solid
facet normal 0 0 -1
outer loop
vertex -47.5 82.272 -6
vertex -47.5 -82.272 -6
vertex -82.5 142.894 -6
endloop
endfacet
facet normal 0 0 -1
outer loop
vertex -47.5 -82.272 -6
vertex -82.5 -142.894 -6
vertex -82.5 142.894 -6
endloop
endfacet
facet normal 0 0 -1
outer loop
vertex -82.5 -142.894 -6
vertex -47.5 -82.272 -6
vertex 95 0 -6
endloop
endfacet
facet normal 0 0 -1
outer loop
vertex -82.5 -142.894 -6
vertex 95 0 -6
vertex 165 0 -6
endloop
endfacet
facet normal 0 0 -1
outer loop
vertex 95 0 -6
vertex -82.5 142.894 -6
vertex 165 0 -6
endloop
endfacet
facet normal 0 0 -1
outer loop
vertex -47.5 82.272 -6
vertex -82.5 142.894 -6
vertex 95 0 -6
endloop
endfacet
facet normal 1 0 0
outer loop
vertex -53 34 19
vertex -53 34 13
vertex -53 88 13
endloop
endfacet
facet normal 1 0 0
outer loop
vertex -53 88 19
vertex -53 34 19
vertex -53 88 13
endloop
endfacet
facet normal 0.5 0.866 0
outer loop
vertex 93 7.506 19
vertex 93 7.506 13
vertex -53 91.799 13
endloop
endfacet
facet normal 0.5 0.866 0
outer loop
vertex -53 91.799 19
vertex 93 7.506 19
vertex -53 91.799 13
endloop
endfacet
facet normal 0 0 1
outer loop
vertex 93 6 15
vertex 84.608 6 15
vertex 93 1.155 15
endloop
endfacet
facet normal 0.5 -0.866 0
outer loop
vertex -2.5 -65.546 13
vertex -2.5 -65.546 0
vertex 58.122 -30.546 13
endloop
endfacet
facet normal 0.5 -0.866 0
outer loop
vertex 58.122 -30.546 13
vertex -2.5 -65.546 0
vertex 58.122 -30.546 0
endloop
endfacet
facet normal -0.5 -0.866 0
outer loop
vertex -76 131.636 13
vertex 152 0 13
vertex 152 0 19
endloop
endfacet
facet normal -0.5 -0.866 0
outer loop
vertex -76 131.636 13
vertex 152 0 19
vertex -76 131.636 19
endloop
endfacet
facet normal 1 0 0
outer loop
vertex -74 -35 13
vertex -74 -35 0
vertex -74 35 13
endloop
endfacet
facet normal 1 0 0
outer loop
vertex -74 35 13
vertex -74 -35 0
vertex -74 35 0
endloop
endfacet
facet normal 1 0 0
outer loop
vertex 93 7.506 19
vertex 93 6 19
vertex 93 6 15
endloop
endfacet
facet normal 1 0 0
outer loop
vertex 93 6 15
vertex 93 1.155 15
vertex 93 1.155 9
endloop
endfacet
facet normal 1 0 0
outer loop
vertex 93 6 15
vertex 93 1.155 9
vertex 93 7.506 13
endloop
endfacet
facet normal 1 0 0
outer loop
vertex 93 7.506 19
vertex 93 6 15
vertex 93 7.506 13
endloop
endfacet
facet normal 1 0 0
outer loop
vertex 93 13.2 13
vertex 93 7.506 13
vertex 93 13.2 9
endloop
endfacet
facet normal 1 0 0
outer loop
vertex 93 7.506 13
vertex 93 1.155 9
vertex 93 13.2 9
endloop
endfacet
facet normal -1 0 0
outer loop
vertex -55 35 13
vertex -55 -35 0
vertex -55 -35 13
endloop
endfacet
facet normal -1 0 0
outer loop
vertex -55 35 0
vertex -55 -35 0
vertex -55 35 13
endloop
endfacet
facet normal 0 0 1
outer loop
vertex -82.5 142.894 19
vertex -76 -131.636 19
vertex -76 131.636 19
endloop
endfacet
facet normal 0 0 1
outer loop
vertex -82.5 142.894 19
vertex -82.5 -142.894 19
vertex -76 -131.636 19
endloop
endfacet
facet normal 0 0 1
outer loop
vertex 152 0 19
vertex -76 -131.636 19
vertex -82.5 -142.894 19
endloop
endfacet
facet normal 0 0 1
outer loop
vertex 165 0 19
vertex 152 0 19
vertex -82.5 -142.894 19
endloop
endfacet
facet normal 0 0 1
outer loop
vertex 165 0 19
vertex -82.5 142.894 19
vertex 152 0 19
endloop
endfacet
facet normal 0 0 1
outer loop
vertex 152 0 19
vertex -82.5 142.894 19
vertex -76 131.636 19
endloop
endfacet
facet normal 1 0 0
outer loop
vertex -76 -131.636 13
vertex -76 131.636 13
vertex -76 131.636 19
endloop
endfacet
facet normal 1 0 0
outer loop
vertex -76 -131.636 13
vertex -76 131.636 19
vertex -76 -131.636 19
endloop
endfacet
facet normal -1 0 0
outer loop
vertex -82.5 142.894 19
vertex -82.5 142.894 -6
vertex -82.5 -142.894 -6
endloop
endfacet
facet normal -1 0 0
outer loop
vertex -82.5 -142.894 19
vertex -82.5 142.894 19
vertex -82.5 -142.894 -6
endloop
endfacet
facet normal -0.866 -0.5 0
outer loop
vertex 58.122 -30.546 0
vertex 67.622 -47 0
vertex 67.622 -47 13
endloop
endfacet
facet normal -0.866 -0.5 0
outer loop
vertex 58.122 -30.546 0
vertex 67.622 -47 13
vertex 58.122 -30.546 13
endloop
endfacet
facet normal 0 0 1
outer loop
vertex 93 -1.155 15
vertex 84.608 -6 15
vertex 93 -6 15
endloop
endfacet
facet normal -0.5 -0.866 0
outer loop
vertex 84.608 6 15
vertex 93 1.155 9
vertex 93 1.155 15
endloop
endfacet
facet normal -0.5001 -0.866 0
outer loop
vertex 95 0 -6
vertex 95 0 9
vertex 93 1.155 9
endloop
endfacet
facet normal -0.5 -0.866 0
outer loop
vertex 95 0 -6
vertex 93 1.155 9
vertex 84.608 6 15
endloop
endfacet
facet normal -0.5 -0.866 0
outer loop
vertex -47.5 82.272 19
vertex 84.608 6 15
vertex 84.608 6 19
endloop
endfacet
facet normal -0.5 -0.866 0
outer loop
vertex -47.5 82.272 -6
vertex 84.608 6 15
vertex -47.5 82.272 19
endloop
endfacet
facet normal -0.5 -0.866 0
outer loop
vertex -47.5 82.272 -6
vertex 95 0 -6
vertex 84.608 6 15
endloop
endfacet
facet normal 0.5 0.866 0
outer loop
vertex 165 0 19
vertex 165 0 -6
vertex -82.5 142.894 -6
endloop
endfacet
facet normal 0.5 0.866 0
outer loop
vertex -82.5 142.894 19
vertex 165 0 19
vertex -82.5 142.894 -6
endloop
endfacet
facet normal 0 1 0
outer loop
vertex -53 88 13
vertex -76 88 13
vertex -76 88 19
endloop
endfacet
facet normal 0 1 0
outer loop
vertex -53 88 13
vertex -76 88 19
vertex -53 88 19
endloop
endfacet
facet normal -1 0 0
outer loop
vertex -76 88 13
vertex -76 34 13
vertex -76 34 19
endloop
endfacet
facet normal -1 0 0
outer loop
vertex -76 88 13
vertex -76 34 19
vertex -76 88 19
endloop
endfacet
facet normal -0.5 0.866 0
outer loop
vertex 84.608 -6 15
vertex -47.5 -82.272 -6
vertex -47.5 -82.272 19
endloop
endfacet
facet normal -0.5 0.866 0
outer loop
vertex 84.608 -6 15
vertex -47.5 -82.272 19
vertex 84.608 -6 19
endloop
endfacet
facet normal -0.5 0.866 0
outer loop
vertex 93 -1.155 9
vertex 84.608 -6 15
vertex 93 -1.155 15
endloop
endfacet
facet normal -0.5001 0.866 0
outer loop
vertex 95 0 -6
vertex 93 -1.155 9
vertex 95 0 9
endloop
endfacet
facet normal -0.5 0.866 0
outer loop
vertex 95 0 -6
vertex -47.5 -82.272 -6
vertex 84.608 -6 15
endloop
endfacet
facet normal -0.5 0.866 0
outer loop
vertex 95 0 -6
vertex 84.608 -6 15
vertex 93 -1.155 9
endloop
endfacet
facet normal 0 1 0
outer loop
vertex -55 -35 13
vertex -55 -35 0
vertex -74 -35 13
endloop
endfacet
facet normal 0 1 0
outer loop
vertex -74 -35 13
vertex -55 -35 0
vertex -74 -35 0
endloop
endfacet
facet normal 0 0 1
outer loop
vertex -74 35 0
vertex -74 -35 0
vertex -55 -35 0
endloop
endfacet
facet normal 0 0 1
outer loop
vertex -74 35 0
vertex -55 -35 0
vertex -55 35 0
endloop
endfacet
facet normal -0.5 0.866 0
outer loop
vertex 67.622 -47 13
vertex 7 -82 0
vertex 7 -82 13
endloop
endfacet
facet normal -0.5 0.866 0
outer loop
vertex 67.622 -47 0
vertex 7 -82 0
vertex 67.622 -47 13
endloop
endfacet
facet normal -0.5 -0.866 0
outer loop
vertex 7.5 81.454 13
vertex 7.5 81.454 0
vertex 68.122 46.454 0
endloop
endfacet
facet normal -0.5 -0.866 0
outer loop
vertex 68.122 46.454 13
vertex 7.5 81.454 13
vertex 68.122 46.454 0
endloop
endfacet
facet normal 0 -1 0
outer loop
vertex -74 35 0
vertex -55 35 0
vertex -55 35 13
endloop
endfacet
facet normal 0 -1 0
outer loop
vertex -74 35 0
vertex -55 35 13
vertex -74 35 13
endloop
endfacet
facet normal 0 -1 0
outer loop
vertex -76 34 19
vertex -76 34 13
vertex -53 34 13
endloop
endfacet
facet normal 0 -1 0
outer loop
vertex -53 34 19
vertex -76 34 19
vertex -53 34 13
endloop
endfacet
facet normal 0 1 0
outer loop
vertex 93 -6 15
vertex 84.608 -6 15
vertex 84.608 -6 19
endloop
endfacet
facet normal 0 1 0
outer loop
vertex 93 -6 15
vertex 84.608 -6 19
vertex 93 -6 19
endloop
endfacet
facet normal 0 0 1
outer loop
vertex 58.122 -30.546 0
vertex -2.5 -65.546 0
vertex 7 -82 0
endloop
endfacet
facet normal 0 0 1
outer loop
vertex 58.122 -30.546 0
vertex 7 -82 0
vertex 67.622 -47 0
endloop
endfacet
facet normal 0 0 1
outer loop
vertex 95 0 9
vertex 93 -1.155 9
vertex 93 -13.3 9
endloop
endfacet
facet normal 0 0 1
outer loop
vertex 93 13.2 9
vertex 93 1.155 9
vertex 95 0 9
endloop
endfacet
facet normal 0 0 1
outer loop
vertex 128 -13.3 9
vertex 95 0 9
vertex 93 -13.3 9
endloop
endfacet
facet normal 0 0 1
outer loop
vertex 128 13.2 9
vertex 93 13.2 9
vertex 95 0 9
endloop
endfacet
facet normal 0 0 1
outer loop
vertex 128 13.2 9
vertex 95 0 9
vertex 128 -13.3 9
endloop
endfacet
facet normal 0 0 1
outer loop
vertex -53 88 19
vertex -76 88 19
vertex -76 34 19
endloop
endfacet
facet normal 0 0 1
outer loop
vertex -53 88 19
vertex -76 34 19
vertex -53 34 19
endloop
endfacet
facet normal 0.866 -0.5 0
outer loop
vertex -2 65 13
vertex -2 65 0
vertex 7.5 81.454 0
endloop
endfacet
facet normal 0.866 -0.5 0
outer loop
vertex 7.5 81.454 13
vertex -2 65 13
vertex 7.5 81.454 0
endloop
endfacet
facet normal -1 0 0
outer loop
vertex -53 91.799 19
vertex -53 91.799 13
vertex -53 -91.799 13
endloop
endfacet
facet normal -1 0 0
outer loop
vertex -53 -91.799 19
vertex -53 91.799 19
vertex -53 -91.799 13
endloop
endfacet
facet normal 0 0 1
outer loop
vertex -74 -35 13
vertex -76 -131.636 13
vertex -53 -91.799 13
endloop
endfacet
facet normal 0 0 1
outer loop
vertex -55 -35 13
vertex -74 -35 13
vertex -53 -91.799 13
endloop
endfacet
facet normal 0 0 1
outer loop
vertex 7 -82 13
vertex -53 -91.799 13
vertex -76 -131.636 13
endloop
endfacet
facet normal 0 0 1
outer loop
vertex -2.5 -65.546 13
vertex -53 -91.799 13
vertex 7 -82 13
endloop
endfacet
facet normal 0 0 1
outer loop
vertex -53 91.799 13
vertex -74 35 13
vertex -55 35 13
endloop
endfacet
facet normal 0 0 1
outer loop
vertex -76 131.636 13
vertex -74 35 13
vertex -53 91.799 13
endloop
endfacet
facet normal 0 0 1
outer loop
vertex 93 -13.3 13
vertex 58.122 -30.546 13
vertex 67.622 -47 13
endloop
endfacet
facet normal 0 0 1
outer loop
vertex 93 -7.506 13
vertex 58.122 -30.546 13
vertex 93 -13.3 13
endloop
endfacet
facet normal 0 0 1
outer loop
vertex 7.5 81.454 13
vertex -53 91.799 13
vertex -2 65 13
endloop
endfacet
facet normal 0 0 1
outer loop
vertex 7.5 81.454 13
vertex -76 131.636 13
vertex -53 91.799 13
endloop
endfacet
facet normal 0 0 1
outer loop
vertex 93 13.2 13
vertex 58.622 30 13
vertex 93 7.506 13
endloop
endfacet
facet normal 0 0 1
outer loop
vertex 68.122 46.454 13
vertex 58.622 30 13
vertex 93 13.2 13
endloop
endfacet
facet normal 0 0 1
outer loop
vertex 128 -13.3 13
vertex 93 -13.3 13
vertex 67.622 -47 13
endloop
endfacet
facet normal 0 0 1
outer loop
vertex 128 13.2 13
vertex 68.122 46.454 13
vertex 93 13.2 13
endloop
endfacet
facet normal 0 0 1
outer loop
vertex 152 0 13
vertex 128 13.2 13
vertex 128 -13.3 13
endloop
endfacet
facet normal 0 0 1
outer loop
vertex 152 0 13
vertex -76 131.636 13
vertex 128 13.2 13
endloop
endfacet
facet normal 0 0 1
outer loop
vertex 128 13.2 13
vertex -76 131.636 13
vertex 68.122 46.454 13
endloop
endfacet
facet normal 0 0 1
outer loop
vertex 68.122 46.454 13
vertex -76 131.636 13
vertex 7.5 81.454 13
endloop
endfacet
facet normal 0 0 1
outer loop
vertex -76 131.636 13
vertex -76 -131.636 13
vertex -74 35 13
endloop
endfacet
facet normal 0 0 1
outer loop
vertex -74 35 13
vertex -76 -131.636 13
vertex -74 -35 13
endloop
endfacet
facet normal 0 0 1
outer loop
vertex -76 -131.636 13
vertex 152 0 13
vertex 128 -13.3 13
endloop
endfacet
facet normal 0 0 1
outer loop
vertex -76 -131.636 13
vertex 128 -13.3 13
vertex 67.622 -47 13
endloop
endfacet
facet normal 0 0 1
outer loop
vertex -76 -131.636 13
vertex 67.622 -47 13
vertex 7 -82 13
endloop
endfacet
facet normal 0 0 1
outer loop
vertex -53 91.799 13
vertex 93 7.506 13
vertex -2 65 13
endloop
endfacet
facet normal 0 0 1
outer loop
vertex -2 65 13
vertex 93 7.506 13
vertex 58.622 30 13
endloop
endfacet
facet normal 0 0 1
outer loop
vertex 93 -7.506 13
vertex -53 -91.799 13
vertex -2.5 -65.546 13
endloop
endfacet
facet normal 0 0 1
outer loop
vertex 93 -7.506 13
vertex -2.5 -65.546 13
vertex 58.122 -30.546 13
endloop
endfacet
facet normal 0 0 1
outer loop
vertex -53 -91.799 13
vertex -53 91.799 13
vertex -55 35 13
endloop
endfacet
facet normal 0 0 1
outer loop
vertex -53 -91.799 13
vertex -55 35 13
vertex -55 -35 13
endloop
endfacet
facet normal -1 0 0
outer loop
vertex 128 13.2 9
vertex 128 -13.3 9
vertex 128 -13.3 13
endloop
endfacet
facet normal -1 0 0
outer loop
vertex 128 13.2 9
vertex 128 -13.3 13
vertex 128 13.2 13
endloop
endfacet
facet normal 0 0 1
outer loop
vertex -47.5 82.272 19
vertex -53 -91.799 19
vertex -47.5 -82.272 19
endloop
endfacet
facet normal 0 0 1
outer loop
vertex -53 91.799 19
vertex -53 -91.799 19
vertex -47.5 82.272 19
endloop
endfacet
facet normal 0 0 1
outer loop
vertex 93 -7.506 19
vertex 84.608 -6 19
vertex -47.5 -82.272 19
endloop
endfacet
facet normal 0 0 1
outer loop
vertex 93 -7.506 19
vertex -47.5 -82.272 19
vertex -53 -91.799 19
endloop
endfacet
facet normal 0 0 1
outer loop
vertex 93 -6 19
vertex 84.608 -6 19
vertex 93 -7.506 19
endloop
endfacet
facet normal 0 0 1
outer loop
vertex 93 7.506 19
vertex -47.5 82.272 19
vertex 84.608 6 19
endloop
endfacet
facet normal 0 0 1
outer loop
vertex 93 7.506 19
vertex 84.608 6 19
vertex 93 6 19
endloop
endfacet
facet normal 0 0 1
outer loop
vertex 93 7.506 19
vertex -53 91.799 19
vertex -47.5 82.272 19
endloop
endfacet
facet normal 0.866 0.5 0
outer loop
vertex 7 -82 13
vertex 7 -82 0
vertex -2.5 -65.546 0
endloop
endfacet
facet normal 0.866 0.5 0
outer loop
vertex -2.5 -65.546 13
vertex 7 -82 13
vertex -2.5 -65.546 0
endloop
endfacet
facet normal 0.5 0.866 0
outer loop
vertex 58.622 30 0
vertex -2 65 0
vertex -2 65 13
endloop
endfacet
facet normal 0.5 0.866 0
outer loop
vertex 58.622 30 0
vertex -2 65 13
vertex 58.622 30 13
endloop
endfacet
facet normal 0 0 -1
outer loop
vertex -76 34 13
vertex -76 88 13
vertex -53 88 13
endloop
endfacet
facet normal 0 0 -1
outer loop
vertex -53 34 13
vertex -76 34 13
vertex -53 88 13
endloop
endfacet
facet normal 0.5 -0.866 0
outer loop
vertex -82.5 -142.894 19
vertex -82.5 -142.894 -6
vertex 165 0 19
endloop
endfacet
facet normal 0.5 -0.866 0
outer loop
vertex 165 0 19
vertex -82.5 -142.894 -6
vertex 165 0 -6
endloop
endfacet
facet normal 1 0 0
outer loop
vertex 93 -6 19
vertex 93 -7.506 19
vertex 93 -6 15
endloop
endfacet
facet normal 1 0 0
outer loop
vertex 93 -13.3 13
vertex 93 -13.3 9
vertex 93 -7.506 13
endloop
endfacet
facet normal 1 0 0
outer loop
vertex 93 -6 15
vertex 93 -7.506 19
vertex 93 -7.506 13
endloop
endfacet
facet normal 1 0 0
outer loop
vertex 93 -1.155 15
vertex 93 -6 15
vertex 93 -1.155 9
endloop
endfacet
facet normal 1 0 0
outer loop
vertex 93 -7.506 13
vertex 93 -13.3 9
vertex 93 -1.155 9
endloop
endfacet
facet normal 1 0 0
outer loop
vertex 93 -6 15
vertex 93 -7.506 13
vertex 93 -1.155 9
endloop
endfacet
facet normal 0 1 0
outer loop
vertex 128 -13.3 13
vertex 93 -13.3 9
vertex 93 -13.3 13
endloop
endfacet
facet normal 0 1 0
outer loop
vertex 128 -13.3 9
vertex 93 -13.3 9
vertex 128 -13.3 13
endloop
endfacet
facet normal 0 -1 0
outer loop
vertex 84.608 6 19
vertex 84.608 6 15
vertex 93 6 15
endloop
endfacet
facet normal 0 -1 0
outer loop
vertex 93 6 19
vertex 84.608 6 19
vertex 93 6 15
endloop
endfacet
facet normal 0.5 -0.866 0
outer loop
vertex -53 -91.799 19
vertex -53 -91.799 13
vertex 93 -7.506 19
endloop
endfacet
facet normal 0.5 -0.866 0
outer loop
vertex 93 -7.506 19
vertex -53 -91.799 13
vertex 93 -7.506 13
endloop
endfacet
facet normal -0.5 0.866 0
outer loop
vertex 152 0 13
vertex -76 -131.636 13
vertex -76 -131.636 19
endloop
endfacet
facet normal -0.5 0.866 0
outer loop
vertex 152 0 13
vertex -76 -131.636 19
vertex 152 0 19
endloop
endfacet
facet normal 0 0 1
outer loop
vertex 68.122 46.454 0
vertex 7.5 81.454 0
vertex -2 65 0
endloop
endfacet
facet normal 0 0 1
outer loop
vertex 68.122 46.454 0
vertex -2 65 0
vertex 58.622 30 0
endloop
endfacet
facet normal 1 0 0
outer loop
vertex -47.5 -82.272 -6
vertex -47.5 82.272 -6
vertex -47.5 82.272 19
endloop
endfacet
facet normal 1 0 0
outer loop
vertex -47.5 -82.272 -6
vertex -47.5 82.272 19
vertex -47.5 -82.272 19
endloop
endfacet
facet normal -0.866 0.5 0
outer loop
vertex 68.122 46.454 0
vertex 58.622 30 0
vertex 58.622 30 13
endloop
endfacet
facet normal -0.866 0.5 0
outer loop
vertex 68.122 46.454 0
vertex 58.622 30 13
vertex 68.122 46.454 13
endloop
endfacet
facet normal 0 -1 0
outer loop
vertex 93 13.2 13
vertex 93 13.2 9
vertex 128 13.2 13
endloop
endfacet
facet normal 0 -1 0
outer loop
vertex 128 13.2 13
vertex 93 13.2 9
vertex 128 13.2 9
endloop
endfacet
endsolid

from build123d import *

# Parameters (mm, degrees)
BOX005_W               = 23
BOX005_H               = 54
BOX005_DEPTH           = 6
PRISM003_DEPTH         = 6
PRISM002_DEPTH         = 6
BOX004_W               = 10
BOX004_H               = 12
BOX004_DEPTH           = 4
BOX003_W               = 35
BOX003_H               = 26.5
BOX003_DEPTH           = 10
BOX002_W               = 70
BOX002_H               = 19
BOX002_DEPTH           = 19
BOX002_PLACEMENT_ANGLE = 30
BOX001_W               = 70
BOX001_H               = 19
BOX001_DEPTH           = 19
BOX001_PLACEMENT_ANGLE = 90
BOX_W                  = 70
BOX_H                  = 19
BOX_DEPTH              = 19
BOX_PLACEMENT_ANGLE    = 30
PRISM001_DEPTH         = 25
PRISM_DEPTH            = 25


with BuildPart() as box005:
    # Box005 → Box005 (new body)
    with BuildSketch(Plane(origin=(-76, 34, 13), x_dir=(1, 0, 0), z_dir=(0, 0, 1))):
        with Locations((11.5, 27)):
            Rectangle(BOX005_W, BOX005_H)
    extrude(amount=BOX005_DEPTH)


with BuildPart() as prism003:
    # Prism003 → Prism003 (new body)
    with BuildSketch(Plane.XY.offset(13)):
        Polygon((106, 0), (-53, 91.798693), (-53, -91.798693), align=None)
    extrude(amount=PRISM003_DEPTH)


with BuildPart() as cut006:
    # Prism002 → Prism002 (new body)
    with BuildSketch(Plane.XY.offset(13)):
        Polygon((152, 0), (-76, 131.635861), (-76, -131.635861), align=None)
    extrude(amount=PRISM002_DEPTH)

    # Cut006: cut Prism003
    add(prism003.part, mode=Mode.SUBTRACT)


with BuildPart() as box004:
    # Box004 → Box004 (new body)
    with BuildSketch(Plane(origin=(84, -6, 15), x_dir=(1, 0, 0), z_dir=(0, 0, 1))):
        with Locations((5, 6)):
            Rectangle(BOX004_W, BOX004_H)
    extrude(amount=BOX004_DEPTH)


with BuildPart() as box003:
    # Box003 → Box003 (new body)
    with BuildSketch(Plane(origin=(93, -13.3, 9), x_dir=(1, 0, 0), z_dir=(0, 0, 1))):
        with Locations((17.5, 13.25)):
            Rectangle(BOX003_W, BOX003_H)
    extrude(amount=BOX003_DEPTH)


with BuildPart() as box002:
    # Box002 → Box002 (new body)
    with BuildSketch(Plane.XY):
        with Locations((35, 9.5)):
            Rectangle(BOX002_W, BOX002_H)
    extrude(amount=BOX002_DEPTH)


with BuildPart() as box002_1:
    # Box002 placement: moved
    add(box002.part.moved(Location((7, -82, 0))).rotate(Axis((7, -82, 0), (0, 0, 1)), BOX002_PLACEMENT_ANGLE))


with BuildPart() as box001:
    # Box001 → Box001 (new body)
    with BuildSketch(Plane.XY):
        with Locations((35, 9.5)):
            Rectangle(BOX001_W, BOX001_H)
    extrude(amount=BOX001_DEPTH)


with BuildPart() as box001_1:
    # Box001 placement: moved
    add(box001.part.moved(Location((-55, -35, 0))).rotate(Axis((-55, -35, 0), (0, 0, 1)), BOX001_PLACEMENT_ANGLE))


with BuildPart() as box:
    # Box → Box (new body)
    with BuildSketch(Plane.XY):
        with Locations((35, 9.5)):
            Rectangle(BOX_W, BOX_H)
    extrude(amount=BOX_DEPTH)


with BuildPart() as box_1:
    # Box placement: moved
    add(box.part.moved(Location((-2, 65, 0))).rotate(Axis((-2, 65, 0), (0, 0, -1)), BOX_PLACEMENT_ANGLE))


with BuildPart() as prism001:
    # Prism001 → Prism001 (new body)
    with BuildSketch(Plane.XY.offset(-6)):
        Polygon((95, 0), (-47.5, 82.272413), (-47.5, -82.272413), align=None)
    extrude(amount=PRISM001_DEPTH)


with BuildPart() as cut007:
    # Prism → Prism (new body)
    with BuildSketch(Plane.XY.offset(-6)):
        Polygon((165, 0), (-82.5, 142.894192), (-82.5, -142.894192), align=None)
    extrude(amount=PRISM_DEPTH)

    # Cut: cut Prism001
    add(prism001.part, mode=Mode.SUBTRACT)

    # Cut001: cut Box
    add(box_1.part, mode=Mode.SUBTRACT)

    # Cut002: cut Box001
    add(box001_1.part, mode=Mode.SUBTRACT)

    # Cut003: cut Box002
    add(box002_1.part, mode=Mode.SUBTRACT)

    # Cut004: cut Box003
    add(box003.part, mode=Mode.SUBTRACT)

    # Cut005: cut Box004
    add(box004.part, mode=Mode.SUBTRACT)

    # Cut007: cut Cut006
    add(cut006.part, mode=Mode.SUBTRACT)


solid = Compound([box005.part, cut007.part])
